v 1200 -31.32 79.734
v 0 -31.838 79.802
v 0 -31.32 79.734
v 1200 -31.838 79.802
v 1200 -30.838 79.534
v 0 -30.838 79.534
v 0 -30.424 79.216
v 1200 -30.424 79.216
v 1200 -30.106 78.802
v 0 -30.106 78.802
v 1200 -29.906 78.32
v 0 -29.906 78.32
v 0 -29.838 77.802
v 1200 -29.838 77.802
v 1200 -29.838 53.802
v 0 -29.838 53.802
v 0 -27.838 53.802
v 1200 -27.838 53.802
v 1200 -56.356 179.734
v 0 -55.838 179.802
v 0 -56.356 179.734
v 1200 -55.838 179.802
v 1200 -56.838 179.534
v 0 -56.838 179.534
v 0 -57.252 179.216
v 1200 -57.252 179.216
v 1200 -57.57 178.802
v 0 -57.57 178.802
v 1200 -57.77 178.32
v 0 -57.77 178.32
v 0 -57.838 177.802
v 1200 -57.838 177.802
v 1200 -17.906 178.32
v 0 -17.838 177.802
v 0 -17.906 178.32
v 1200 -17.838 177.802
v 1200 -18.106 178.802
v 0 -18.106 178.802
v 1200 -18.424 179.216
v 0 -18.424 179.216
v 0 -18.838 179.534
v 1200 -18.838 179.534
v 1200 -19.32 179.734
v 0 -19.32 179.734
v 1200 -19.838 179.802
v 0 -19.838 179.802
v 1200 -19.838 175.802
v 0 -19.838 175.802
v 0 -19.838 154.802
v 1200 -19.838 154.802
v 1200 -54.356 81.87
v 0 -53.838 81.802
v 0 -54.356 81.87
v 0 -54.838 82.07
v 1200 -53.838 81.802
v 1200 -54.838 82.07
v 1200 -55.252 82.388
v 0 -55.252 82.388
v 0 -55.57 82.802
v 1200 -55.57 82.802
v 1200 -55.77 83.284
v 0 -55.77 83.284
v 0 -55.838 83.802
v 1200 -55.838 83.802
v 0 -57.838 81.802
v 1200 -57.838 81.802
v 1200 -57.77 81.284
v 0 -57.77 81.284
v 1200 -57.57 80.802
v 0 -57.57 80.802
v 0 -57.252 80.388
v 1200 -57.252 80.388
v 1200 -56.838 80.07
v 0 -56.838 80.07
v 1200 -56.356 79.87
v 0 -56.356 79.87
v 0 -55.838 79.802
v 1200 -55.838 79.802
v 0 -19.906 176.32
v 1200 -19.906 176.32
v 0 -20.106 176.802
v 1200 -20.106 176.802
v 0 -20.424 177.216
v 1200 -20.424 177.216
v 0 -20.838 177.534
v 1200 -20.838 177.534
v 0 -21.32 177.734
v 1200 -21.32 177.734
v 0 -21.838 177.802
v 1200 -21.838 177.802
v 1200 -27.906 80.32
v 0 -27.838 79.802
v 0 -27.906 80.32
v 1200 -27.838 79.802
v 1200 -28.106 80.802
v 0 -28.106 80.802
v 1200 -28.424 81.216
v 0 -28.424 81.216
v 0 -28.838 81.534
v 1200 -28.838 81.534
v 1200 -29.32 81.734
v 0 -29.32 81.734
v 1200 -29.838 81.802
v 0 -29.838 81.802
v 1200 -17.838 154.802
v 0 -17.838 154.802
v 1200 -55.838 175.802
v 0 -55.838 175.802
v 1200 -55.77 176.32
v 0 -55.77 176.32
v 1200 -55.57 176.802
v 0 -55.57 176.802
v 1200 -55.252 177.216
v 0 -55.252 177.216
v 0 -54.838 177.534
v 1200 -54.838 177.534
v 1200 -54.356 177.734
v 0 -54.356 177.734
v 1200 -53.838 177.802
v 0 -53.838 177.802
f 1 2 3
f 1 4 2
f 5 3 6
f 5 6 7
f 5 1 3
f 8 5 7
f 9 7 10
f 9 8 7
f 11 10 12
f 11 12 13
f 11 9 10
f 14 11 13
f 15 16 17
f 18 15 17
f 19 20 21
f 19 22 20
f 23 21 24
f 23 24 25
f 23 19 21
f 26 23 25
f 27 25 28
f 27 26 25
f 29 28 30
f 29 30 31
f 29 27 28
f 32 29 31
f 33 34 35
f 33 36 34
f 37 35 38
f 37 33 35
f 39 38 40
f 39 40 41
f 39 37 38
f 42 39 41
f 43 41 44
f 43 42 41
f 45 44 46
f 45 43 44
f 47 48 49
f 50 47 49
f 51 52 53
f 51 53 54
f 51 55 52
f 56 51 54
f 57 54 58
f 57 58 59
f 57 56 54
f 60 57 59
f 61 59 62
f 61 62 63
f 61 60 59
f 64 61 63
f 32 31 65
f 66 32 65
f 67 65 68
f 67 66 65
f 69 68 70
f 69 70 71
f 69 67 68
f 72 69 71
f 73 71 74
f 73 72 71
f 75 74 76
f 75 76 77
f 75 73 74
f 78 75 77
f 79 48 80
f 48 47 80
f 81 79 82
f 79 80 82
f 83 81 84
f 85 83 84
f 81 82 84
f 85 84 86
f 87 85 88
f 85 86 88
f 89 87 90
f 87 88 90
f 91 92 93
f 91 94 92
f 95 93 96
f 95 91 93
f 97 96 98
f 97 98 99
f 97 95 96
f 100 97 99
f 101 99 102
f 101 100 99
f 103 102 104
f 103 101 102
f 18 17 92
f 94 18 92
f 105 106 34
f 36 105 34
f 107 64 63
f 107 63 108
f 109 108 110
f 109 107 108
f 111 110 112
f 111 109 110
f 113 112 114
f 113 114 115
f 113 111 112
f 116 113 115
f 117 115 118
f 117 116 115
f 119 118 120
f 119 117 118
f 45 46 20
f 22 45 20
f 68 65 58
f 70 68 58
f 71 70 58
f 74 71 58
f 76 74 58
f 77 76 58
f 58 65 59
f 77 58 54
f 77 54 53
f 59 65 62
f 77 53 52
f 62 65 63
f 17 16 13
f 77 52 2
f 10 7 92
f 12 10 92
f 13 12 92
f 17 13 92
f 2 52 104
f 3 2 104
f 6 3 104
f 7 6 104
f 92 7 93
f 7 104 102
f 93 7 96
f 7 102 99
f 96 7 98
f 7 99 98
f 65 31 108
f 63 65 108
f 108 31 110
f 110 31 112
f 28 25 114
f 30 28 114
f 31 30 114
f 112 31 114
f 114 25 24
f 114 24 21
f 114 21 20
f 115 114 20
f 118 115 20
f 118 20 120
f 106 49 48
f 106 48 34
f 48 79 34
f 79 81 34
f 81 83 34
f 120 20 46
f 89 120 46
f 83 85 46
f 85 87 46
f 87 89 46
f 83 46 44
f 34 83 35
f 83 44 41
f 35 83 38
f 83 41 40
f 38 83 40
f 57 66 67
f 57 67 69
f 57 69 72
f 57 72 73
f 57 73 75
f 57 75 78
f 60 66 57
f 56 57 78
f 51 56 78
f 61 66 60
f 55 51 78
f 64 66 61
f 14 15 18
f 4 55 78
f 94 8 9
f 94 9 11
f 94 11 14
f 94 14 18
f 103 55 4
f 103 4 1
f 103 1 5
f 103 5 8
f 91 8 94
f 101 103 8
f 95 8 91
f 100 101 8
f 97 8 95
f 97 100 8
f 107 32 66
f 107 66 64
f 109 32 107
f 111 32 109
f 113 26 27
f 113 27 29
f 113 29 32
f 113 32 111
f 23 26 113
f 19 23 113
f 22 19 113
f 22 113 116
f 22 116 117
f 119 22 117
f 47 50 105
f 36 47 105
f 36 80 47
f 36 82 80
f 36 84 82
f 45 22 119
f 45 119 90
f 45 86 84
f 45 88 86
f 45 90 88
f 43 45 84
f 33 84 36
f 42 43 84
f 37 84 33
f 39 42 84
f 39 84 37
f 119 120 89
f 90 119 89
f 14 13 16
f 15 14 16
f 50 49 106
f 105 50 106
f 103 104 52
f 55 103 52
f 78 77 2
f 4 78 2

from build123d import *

# Parameters (mm, degrees)
F1_DEPTH = 1200
F2_R     = 2


# Not quite as in the source:
# - a feature names something its author has since deleted; it is built from what else it names


with BuildPart() as f1:
    # F0 (on Right) → F1 (new body)
    with BuildSketch(Plane.YZ):
        Polygon((-19.8378913403, 177.8021101952), (-19.8378913403, 154.8021101952), (-17.8378913403, 154.8021101952), (-17.8378913403, 179.8021101952), (-57.8378913403, 179.8021101952), (-57.8378913403, 79.8021101952), (-29.8378913403, 79.8021101952), (-29.8378913403, 53.8021101952), (-27.8378913403, 53.8021101952), (-27.8378913403, 81.8021101952), (-55.8378913403, 81.8021101952), (-55.8378913403, 177.8021101952), align=None)
    extrude(amount=F1_DEPTH)

    # F2
    f2_edges = [f1.edges().sort_by_distance(p)[0] for p in [
        (600, -57.837891, 179.80211),
        (600, -17.837891, 179.80211),
        (600, -57.837891, 79.80211),
        (600, -27.837891, 81.80211),
        (600, -55.837891, 81.80211),
        (600, -29.837891, 79.80211),
        (600, -19.837891, 177.80211),
        (600, -55.837891, 177.80211),
    ]]
    fillet(f2_edges, radius=F2_R)


solid = f1.part
